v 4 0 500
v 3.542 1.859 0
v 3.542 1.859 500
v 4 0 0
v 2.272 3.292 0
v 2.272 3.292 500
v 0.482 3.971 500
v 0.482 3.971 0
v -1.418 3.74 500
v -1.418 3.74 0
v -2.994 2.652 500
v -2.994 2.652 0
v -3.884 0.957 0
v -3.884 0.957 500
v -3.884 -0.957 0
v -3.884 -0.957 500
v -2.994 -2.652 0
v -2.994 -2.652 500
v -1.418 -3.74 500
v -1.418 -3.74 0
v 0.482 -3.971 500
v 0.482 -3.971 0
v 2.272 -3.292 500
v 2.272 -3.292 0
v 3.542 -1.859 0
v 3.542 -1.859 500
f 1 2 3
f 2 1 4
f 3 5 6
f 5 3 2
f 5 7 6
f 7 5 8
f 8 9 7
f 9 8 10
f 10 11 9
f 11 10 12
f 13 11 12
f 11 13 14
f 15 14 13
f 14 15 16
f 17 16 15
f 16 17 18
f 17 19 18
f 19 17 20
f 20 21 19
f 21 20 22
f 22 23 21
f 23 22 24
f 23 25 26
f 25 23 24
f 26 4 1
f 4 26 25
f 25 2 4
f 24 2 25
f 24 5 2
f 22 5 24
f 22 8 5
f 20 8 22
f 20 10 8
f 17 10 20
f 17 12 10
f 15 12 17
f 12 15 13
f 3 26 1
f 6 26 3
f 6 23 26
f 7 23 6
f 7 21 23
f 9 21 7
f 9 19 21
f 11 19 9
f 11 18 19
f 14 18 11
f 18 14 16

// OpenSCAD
module rod(length,diameter) {
	color("silver") cylinder(length,diameter/2,diameter/2,false);
}

rod(500,8);
